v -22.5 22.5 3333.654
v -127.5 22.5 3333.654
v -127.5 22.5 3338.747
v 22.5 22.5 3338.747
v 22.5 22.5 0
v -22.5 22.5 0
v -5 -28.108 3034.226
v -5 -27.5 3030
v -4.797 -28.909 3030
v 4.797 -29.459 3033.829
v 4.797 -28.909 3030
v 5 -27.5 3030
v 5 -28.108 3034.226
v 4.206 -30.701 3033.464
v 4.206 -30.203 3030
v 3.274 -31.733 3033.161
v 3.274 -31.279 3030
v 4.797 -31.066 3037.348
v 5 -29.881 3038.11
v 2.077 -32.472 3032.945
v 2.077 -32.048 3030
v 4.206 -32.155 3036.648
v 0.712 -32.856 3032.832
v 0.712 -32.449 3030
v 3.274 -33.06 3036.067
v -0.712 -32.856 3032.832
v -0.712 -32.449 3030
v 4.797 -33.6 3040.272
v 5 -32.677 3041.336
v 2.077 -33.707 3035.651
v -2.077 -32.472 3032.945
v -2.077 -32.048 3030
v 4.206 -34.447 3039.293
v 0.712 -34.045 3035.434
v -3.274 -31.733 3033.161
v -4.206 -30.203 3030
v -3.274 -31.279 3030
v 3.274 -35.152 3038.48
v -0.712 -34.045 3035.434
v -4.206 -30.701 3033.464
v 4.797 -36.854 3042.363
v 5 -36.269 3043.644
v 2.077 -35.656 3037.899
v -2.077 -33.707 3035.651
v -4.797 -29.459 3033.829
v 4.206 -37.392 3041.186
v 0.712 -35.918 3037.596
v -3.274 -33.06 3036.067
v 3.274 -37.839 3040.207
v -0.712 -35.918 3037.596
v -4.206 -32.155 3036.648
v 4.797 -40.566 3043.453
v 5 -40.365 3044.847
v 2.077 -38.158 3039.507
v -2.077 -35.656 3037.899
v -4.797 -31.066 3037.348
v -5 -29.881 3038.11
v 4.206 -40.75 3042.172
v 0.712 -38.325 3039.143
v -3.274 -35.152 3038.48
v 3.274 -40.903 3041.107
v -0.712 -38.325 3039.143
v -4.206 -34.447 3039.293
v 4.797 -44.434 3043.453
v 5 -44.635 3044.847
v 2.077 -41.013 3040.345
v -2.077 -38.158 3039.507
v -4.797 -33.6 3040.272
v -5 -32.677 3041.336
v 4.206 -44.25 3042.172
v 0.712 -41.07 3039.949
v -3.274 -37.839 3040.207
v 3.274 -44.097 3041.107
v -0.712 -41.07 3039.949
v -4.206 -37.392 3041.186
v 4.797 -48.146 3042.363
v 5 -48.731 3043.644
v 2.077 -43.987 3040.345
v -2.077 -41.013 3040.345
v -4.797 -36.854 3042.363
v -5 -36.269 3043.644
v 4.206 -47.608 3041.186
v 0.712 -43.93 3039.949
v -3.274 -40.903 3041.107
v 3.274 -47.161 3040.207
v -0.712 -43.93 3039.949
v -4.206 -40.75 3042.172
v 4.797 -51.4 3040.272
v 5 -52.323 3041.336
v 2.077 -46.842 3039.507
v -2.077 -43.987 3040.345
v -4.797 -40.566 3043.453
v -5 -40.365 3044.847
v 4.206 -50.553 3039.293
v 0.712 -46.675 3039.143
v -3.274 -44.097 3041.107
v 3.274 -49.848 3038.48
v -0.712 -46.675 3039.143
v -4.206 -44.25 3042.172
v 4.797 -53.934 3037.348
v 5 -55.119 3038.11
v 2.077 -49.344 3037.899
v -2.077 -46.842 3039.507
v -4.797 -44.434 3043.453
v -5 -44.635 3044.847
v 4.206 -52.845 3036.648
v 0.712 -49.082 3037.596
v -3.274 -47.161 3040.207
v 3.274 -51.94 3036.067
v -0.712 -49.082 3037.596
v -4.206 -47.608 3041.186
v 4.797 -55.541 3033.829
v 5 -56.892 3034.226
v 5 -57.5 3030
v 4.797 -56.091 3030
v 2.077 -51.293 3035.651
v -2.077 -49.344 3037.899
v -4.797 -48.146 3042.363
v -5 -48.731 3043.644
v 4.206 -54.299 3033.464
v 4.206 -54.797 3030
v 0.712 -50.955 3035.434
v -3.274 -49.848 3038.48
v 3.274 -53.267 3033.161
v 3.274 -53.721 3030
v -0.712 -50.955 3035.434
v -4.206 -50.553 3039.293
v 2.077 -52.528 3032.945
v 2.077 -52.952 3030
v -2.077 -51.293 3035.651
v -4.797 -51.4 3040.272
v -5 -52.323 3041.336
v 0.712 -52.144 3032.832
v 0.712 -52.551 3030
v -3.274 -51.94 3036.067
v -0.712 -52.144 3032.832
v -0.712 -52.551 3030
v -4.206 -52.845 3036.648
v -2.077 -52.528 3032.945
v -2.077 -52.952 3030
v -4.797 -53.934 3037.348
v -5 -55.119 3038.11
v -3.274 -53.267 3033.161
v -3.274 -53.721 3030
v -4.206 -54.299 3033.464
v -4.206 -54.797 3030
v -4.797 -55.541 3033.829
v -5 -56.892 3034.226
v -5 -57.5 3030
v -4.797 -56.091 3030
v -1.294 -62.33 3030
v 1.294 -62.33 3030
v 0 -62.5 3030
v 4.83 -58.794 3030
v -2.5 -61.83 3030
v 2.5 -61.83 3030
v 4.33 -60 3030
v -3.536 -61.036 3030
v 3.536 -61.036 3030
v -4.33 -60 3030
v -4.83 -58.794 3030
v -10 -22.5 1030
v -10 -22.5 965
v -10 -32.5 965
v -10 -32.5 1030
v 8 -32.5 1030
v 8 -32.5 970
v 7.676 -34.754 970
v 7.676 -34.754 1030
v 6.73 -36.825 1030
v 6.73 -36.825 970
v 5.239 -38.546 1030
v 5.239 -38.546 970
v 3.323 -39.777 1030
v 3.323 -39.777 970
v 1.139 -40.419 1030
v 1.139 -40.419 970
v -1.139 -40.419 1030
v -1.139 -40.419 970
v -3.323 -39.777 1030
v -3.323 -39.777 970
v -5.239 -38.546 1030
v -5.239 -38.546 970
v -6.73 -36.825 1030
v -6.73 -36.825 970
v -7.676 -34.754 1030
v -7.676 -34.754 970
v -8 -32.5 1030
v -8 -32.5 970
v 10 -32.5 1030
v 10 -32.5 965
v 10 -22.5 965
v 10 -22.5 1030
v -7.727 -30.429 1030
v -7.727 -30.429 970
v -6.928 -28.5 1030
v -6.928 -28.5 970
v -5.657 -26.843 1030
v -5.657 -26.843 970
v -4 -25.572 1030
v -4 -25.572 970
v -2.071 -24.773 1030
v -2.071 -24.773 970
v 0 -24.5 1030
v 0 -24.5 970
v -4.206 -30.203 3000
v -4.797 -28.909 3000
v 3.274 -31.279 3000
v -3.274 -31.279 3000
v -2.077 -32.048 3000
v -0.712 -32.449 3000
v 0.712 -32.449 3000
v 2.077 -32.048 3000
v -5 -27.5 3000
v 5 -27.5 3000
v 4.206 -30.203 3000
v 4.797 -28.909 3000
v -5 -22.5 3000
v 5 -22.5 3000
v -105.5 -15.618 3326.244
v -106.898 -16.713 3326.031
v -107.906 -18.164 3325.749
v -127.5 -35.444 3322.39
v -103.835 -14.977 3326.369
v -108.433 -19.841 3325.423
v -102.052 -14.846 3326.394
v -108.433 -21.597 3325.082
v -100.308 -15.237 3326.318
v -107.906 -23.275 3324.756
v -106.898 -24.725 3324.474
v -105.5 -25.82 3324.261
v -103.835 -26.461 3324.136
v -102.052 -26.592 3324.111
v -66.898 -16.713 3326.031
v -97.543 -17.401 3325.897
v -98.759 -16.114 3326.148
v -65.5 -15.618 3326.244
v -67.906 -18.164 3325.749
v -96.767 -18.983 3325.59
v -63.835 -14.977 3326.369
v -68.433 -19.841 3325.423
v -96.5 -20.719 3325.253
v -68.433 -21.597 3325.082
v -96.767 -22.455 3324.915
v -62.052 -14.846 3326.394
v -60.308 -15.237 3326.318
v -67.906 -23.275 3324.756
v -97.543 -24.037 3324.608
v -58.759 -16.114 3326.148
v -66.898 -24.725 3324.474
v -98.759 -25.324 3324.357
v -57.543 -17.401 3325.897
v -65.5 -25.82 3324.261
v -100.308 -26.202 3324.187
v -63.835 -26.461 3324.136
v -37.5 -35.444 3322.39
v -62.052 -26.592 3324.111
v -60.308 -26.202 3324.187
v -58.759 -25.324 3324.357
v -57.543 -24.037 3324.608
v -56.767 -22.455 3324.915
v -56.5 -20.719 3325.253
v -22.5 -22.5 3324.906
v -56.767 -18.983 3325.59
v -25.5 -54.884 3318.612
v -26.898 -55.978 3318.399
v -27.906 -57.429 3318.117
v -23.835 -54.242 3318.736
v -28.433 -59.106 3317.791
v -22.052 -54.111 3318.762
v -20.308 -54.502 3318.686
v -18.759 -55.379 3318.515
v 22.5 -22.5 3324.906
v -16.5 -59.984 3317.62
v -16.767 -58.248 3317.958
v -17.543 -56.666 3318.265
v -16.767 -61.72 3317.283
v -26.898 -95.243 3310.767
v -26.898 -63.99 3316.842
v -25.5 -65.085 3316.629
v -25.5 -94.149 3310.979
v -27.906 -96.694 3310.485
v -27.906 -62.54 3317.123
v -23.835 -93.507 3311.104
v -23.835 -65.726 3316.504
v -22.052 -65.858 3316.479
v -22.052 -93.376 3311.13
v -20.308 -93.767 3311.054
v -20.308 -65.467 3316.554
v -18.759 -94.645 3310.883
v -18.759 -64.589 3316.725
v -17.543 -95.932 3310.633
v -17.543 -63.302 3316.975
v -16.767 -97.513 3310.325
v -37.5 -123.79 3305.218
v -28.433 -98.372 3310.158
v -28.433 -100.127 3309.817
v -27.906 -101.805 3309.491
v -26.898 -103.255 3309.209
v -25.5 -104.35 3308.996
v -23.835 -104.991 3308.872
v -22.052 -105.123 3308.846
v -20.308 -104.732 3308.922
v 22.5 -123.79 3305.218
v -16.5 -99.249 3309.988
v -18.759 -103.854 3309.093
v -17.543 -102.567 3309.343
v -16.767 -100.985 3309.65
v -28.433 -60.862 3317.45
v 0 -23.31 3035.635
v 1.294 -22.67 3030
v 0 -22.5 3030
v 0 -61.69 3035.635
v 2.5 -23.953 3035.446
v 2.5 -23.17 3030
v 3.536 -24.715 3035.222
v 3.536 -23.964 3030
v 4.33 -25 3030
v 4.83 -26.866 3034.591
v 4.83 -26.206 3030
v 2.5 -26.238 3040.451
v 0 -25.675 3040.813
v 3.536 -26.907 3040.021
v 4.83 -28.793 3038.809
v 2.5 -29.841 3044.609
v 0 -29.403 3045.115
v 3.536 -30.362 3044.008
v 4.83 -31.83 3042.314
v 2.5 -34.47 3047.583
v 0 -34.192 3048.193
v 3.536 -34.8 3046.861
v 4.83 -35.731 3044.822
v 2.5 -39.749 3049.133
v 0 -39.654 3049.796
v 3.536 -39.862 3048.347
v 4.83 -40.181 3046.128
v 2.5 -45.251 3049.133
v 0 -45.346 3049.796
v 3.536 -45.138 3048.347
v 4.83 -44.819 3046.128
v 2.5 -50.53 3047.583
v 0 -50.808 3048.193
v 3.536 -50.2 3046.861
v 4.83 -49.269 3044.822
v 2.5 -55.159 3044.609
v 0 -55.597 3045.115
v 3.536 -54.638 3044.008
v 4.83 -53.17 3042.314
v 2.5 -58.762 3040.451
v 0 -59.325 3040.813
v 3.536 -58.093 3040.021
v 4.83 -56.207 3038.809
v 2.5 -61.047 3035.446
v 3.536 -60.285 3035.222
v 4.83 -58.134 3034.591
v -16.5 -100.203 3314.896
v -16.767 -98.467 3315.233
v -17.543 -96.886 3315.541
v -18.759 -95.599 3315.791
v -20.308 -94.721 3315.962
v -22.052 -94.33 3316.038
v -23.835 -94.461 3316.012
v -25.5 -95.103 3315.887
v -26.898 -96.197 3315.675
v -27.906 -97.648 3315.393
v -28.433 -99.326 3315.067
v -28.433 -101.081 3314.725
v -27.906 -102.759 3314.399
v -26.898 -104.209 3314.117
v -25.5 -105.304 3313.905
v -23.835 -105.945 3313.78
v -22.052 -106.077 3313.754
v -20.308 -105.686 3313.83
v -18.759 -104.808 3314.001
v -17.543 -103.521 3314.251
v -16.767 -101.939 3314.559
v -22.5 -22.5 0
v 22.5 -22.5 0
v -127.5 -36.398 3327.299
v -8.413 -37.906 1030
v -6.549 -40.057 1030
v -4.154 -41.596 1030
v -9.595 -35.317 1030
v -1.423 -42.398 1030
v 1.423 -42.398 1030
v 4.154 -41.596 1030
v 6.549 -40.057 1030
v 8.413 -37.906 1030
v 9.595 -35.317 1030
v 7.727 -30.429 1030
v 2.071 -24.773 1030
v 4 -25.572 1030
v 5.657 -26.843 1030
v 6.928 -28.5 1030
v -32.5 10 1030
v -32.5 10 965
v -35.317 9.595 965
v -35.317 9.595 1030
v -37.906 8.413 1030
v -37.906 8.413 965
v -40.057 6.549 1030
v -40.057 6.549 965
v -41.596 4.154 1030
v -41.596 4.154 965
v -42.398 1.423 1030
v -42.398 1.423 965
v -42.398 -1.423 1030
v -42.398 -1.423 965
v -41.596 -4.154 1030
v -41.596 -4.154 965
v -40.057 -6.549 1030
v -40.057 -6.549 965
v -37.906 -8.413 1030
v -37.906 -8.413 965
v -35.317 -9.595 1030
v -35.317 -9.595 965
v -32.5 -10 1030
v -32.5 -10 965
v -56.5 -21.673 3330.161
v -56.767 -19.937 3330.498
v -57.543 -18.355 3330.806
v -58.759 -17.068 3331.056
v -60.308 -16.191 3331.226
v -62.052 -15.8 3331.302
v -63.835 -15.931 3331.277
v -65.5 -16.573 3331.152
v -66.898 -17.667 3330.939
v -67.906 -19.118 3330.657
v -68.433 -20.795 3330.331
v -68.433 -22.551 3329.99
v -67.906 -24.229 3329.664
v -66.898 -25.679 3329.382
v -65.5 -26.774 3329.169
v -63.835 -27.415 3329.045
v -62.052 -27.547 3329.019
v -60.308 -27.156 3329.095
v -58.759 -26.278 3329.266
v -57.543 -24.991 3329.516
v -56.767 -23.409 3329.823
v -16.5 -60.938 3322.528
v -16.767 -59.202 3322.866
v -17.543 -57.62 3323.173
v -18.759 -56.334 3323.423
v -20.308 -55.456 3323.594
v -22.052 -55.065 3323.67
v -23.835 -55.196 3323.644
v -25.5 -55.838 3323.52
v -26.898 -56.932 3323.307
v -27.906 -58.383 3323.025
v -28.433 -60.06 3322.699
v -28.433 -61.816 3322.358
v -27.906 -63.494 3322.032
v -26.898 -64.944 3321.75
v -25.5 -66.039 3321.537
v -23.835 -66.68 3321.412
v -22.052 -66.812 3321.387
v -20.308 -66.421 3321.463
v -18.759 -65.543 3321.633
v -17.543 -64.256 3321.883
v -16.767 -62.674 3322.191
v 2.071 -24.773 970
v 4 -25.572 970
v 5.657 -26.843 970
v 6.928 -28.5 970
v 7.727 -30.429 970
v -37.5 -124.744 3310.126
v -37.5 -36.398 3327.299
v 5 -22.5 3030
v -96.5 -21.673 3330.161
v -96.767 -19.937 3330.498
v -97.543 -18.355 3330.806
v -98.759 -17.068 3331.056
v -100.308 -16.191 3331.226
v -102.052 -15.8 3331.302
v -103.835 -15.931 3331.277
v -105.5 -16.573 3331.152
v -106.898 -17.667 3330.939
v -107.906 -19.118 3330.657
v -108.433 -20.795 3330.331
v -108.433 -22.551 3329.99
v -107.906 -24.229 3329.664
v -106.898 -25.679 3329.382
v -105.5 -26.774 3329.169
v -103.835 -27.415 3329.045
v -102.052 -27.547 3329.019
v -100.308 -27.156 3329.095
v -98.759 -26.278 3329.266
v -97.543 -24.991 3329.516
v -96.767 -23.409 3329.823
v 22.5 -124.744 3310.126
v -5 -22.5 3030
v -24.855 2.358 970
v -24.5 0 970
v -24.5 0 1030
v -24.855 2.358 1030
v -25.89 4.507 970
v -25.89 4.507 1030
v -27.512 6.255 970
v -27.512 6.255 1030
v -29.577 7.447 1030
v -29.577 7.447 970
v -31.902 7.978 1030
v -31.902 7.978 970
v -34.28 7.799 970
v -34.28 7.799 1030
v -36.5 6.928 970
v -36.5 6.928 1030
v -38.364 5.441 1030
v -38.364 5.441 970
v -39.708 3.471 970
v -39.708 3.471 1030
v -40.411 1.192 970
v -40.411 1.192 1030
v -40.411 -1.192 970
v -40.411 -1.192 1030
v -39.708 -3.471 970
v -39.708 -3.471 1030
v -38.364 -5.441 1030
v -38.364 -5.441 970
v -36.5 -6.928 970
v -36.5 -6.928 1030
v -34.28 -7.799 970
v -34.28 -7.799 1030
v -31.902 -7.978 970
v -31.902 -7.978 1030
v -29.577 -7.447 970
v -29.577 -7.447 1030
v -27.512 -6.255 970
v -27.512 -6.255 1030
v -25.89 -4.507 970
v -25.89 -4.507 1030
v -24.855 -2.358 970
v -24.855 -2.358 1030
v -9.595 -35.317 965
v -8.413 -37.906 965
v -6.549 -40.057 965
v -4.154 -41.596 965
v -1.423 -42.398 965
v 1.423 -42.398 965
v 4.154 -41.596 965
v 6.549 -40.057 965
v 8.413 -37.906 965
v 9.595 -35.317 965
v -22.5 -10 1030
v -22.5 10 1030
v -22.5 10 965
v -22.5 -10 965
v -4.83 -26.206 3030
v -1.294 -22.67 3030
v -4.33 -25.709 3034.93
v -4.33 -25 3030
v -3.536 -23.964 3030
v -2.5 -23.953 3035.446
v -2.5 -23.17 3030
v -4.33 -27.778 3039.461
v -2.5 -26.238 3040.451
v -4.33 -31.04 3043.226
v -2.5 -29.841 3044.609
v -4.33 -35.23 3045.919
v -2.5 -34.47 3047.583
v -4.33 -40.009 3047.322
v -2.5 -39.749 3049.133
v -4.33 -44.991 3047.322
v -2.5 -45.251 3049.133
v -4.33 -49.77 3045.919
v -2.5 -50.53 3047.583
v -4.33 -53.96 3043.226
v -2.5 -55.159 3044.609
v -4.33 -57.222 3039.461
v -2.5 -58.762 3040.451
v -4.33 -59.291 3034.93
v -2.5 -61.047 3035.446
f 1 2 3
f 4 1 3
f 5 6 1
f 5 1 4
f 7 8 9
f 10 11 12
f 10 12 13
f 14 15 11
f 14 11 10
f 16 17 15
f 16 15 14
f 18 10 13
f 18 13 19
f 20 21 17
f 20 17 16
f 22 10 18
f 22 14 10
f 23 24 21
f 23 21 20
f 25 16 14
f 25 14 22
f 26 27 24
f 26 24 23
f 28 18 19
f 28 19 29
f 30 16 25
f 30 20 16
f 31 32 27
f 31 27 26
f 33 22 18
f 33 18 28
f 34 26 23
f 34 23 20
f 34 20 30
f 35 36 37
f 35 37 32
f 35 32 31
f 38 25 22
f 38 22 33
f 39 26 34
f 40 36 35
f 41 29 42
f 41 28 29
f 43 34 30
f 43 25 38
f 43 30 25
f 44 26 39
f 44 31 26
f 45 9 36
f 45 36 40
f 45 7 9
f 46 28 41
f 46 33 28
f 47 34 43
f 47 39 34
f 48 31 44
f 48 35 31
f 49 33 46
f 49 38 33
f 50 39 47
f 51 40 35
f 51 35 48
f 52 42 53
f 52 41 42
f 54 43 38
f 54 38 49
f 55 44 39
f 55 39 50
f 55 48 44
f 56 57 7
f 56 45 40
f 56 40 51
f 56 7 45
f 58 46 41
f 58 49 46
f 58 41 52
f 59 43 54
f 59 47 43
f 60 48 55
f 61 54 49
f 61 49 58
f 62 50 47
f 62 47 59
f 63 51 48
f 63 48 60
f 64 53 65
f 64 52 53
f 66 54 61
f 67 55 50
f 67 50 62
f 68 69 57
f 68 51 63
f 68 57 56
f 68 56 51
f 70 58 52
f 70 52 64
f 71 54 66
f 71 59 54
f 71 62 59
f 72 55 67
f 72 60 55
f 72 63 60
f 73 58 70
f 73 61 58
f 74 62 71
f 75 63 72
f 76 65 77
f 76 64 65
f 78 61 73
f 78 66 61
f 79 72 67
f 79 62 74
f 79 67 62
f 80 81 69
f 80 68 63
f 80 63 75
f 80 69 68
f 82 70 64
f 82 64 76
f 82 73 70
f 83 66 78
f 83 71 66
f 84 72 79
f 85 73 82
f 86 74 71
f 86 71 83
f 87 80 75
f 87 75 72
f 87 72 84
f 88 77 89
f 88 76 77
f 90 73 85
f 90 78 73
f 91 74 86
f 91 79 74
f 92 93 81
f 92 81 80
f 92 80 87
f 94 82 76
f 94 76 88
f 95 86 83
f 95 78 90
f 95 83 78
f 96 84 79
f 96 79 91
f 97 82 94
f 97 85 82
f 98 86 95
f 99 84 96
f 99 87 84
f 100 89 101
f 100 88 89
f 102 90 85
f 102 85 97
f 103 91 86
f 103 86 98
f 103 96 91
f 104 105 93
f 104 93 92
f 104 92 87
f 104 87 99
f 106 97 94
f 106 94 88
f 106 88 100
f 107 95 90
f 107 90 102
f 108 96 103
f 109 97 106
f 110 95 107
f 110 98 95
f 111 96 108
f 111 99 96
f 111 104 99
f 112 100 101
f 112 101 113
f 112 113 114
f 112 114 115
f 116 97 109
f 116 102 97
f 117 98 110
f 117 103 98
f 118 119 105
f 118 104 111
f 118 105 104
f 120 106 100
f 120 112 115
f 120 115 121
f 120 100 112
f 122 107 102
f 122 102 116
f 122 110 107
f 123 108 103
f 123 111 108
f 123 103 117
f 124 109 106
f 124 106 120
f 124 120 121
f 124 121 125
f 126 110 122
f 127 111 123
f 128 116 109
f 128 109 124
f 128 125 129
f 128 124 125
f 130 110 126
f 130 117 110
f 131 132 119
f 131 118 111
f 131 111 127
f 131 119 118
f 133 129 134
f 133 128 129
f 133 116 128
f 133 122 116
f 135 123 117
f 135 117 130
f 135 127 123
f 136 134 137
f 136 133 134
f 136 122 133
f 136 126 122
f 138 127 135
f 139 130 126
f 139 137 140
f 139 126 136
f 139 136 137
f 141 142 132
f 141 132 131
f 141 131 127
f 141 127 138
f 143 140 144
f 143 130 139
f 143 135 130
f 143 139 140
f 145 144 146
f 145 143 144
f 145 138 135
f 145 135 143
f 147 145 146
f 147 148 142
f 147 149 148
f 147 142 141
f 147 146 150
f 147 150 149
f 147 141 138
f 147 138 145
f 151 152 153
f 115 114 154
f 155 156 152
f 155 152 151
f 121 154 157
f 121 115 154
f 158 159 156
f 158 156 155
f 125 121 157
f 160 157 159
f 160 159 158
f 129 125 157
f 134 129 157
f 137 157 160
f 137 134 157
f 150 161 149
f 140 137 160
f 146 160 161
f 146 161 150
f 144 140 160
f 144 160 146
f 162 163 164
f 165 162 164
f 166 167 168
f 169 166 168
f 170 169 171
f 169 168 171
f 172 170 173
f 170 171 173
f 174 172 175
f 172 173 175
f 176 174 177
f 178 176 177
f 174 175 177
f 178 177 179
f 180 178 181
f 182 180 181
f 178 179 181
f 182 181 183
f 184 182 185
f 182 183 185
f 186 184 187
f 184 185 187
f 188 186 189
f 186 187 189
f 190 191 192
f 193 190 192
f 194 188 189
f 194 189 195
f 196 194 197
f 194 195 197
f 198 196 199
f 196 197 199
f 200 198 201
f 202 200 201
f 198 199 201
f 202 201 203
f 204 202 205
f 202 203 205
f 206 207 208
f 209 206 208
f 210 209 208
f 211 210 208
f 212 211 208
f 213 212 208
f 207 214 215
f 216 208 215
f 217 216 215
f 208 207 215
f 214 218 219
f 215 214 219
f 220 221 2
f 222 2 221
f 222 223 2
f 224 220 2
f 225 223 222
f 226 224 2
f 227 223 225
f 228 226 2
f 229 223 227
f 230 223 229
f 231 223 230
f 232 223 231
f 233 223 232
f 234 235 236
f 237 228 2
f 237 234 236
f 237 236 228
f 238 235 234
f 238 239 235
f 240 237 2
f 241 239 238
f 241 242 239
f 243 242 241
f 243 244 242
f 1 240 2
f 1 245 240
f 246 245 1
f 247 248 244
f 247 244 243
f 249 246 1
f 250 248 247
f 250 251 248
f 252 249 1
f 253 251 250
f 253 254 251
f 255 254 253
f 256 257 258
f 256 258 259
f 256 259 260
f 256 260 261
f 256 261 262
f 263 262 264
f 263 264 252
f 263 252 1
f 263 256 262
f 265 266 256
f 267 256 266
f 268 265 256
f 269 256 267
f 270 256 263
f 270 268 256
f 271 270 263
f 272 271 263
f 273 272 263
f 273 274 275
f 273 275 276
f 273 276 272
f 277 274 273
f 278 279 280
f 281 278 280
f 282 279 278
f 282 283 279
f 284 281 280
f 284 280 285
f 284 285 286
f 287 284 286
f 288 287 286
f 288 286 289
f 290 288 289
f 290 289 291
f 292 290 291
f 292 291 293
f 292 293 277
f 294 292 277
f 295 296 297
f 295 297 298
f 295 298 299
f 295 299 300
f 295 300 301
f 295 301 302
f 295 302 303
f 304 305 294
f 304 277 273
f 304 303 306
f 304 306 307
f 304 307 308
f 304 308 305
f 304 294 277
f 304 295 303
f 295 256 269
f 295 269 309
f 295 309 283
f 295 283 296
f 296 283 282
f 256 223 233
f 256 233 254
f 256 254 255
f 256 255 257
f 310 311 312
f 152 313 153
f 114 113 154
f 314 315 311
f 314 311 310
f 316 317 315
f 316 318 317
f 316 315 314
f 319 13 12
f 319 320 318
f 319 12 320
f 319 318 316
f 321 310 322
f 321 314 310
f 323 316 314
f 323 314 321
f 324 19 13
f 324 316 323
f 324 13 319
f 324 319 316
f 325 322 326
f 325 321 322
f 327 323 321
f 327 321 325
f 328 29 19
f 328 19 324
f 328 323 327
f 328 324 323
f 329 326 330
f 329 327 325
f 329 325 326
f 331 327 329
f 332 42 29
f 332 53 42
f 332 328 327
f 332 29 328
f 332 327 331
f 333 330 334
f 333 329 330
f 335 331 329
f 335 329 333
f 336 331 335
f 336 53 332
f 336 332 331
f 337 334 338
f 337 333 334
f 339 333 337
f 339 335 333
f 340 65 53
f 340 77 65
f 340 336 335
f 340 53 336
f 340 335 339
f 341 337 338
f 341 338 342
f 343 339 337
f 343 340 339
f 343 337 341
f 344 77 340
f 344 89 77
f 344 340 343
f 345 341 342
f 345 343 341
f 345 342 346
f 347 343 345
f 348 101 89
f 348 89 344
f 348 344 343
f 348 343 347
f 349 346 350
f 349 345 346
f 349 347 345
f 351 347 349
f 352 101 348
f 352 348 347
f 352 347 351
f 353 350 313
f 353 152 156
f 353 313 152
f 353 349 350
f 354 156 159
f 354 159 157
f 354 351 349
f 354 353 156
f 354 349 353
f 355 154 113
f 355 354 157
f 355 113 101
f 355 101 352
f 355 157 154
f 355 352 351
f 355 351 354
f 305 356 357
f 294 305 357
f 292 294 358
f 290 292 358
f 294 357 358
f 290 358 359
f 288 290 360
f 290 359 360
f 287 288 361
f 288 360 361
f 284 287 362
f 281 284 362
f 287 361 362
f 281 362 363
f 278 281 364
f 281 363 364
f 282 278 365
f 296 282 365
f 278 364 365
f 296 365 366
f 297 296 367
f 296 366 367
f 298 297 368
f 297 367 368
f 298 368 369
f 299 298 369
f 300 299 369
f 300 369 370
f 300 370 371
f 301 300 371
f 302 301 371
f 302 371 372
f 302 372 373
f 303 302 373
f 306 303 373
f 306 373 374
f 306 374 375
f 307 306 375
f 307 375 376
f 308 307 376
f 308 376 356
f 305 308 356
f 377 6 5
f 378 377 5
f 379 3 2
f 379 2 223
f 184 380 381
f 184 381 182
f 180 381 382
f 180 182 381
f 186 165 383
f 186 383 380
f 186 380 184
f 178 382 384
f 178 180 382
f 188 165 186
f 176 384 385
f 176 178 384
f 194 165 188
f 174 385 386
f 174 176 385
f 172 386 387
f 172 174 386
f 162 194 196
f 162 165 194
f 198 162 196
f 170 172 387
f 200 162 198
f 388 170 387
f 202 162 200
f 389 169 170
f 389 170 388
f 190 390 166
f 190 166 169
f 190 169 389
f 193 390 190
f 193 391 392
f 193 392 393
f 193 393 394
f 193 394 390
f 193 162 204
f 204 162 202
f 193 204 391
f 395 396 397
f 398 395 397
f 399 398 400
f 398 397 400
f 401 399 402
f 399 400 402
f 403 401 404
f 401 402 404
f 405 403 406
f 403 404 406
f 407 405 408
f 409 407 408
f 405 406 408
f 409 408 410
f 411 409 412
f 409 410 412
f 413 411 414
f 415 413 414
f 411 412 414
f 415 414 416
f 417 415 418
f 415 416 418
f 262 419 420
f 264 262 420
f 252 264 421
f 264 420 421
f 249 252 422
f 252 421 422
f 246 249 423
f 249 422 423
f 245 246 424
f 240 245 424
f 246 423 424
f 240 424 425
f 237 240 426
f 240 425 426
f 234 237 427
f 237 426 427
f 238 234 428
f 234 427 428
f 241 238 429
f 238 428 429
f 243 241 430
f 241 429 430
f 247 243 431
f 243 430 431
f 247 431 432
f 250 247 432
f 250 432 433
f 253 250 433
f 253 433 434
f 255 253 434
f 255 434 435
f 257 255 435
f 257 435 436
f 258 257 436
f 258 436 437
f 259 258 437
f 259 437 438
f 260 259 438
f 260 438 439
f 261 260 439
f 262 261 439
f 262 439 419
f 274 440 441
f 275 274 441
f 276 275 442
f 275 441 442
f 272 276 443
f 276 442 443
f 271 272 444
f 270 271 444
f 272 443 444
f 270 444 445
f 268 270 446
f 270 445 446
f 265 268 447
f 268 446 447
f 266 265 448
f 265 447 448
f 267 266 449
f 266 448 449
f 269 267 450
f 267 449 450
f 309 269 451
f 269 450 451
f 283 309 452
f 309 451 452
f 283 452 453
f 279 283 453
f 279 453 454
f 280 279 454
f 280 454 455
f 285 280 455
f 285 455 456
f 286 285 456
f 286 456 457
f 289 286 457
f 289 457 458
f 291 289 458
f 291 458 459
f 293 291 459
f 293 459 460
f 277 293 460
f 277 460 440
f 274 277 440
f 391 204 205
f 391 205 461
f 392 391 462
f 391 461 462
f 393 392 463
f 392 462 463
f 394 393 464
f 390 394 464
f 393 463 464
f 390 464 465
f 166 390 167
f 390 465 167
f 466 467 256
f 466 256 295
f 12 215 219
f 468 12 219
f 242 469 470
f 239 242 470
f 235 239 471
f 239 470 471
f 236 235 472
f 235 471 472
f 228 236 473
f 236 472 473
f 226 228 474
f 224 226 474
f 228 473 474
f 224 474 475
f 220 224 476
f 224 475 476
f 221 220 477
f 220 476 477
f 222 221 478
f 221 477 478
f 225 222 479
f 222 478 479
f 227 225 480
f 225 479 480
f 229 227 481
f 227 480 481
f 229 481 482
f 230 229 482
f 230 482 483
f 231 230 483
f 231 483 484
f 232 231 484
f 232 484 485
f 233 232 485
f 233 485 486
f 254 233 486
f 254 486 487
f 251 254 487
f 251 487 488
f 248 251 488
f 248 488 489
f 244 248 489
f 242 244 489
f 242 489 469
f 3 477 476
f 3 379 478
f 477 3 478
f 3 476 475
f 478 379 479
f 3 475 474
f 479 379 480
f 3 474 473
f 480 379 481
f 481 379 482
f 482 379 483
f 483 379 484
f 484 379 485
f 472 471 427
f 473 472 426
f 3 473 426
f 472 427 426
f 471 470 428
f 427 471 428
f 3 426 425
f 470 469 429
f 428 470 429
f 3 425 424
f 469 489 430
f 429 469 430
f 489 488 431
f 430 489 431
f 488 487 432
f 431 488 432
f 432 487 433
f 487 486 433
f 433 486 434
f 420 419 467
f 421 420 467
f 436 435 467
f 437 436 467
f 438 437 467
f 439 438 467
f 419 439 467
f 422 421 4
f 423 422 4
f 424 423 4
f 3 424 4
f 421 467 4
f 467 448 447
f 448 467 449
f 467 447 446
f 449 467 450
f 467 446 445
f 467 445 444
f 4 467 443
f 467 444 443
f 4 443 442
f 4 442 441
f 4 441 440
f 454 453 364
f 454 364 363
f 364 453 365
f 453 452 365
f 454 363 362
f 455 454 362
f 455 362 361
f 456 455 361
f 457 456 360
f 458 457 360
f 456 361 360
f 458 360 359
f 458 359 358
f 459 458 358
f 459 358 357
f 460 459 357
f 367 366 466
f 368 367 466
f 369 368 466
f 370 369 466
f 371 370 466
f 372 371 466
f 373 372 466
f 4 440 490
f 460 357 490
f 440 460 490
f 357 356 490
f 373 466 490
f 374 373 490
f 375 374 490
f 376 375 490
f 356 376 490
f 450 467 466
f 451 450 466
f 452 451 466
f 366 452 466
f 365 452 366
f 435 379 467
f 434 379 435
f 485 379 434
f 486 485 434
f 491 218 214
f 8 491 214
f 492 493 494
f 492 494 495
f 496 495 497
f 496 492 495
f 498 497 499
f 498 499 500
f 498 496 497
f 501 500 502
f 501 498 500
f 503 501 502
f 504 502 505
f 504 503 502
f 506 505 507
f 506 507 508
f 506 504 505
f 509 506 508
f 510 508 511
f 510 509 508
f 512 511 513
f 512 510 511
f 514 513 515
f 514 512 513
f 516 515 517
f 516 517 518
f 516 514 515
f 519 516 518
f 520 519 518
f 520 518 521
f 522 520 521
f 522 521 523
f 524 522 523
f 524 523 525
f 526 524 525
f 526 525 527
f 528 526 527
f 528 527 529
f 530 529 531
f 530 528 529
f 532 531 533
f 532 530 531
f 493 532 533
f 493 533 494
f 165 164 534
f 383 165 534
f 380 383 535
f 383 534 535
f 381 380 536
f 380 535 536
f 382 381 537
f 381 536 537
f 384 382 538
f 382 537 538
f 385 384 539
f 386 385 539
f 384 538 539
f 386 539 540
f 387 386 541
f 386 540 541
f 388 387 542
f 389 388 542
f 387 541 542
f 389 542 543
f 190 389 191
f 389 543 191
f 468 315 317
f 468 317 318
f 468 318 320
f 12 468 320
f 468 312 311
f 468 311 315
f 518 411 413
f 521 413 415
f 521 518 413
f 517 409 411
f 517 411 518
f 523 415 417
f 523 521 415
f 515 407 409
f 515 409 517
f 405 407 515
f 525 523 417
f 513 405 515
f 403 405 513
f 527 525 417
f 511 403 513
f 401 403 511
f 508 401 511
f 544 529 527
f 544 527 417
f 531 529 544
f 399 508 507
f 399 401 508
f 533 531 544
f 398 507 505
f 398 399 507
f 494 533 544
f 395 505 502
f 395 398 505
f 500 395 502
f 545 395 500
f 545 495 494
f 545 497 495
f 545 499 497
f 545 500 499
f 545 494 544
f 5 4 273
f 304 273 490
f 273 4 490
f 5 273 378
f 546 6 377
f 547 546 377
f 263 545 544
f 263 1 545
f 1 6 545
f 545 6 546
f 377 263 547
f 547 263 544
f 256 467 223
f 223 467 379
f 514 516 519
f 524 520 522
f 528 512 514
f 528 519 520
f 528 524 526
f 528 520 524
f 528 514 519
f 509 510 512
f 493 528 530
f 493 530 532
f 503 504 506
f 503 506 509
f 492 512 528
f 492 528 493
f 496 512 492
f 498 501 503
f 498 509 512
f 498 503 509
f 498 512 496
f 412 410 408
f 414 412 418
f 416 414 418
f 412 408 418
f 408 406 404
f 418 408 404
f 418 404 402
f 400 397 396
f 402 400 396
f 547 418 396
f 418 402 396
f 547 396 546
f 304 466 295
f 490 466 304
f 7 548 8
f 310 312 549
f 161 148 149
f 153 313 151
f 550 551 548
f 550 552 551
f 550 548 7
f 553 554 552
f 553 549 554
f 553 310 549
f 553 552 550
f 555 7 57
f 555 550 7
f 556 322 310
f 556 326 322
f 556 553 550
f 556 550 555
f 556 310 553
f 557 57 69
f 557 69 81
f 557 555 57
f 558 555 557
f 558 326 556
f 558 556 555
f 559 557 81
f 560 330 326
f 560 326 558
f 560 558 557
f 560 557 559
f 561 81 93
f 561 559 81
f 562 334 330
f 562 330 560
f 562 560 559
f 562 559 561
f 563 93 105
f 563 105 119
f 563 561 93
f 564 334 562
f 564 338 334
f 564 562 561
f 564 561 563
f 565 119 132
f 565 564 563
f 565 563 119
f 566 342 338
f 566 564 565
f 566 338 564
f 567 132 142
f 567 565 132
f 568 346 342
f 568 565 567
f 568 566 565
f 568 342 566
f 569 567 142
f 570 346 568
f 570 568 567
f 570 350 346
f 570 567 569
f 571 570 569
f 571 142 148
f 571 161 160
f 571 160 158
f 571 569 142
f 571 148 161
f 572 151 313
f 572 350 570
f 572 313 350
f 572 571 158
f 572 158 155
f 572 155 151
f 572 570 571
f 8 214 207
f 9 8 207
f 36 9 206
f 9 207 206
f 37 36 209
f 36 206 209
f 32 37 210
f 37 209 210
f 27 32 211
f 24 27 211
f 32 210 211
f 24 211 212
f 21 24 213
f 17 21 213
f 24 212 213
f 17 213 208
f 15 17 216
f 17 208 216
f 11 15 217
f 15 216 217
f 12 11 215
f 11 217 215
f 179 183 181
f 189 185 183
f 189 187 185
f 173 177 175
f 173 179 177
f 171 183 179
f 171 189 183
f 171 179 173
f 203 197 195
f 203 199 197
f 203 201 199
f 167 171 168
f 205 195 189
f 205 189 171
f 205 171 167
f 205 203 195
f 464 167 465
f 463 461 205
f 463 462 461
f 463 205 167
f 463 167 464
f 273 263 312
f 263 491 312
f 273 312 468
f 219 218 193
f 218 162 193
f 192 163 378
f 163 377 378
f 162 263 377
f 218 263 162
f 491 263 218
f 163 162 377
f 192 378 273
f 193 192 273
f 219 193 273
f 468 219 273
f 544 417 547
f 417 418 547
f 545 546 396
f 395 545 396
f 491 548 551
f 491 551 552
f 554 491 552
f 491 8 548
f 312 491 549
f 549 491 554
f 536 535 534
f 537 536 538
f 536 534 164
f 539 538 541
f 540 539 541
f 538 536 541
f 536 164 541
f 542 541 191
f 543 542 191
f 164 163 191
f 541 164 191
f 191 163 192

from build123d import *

# Parameters (mm, degrees)
F0_W      = 45
F0_H      = 45
F1_DEPTH  = 3330
F4_DEPTH  = 5
F7_W      = 45
F7_H      = 45.842251273
F8_DEPTH  = 25
F9_W      = 60
F9_H      = 60
F9_W_2    = 90
F9_H_2    = 90
F10_DEPTH = 5
F11_R     = 6
F12_DEPTH = 25
F13_W     = 150
F13_H     = 4.7702248844
F14_DEPTH = 3358.6871623993
F15_R     = 8
F16_DEPTH = 60
F20_DEPTH = 109
F21_DEPTH = 30


with BuildPart() as f1:
    # F0 (on Top) → F1 (new body)
    with BuildSketch(Plane.XY):
        Rectangle(F0_W, F0_H)
    extrude(amount=F1_DEPTH)

    # F3 (on offset) → F4 (join)
    with BuildSketch(Plane.XY.offset(965)):
        Polygon((2, -22.5), (0, -22.5), (0, -32.5), (2, -32.5), (2, -22.7020410289), align=None)
        Polygon((0, -32.5), (0, -22.5), (-2, -22.5), (-2, -22.7020410289), (-2, -32.5), align=None)
        with BuildLine():
            Line((2, -32.5), (0, -32.5))
            Line((0, -32.5), (-2, -32.5))
            Line((-2, -32.5), (-10, -32.5))
            ThreePointArc((-10, -32.5), (0, -42.5), (10, -32.5))
            Line((10, -32.5), (2, -32.5))
        make_face()
        with BuildLine():
            Line((-32.5, 0), (-22.5, 0))
            ThreePointArc((-22.5, 0), (-25.4289321881, 7.0710678119), (-32.5, 10))
            Line((-32.5, 10), (-32.5, 0))
        make_face()
        with BuildLine():
            Line((-32.5, -10), (-32.5, 0))
            Line((-32.5, 0), (-32.5, 10))
            ThreePointArc((-32.5, 10), (-42.5, 0), (-32.5, -10))
        make_face()
        with BuildLine():
            ThreePointArc((-32.5, -10), (-25.4289321881, -7.0710678119), (-22.5, 0))
            Line((-22.5, 0), (-32.5, 0))
            Line((-32.5, 0), (-32.5, -10))
        make_face()
        with BuildLine():
            Line((2, -22.7020410289), (2, -32.5))
            Line((2, -32.5), (10, -32.5))
            ThreePointArc((10, -32.5), (7.7459666924, -26.1754446797), (2, -22.7020410289))
        make_face()
        with BuildLine():
            Line((10, -22.5), (2, -22.5))
            Line((2, -22.5), (2, -22.7020410289))
            ThreePointArc((2, -22.7020410289), (7.7459666924, -26.1754446797), (10, -32.5))
            Line((10, -32.5), (10, -22.5))
        make_face()
        with BuildLine():
            Line((-10, -32.5), (-2, -32.5))
            Line((-2, -32.5), (-2, -22.7020410289))
            ThreePointArc((-2, -22.7020410289), (-7.7459666924, -26.1754446797), (-10, -32.5))
        make_face()
        with BuildLine():
            Line((-2, -22.7020410289), (-2, -22.5))
            Line((-2, -22.5), (-10, -22.5))
            Line((-10, -22.5), (-10, -32.5))
            ThreePointArc((-10, -32.5), (-7.7459666924, -26.1754446797), (-2, -22.7020410289))
        make_face()
        with BuildLine():
            Line((-22.5, -10), (-22.5, 0))
            ThreePointArc((-22.5, 0), (-25.4289321881, -7.0710678119), (-32.5, -10))
            Line((-32.5, -10), (-22.5, -10))
        make_face()
        with BuildLine():
            ThreePointArc((-32.5, 10), (-25.4289321881, 7.0710678119), (-22.5, 0))
            Line((-22.5, 0), (-22.5, 10))
            Line((-22.5, 10), (-32.5, 10))
        make_face()
    extrude(amount=F4_DEPTH)

    # F7 (on face) → F8 (join)
    with BuildSketch(Plane(origin=(0, -624.5391596736, 3212.9754420296), x_dir=(1, 0, 0), z_dir=(0, 0.1908089954, -0.9816271834))):
        with Locations((0, -636.2284686128)):
            Rectangle(F7_W, F7_H)
    extrude(amount=F8_DEPTH)

    # F9 (on face) → F10 (join)
    with BuildSketch(Plane(origin=(0, -624.5391596736, 3212.9754420296), x_dir=(1, 0, 0), z_dir=(0, 0.1908089954, -0.9816271834))):
        with Locations((-7.5, -629.1495942493)):
            Rectangle(F9_W, F9_H)
        with Locations((-82.5, -629.1495942493)):
            Rectangle(F9_W_2, F9_H)
        with Locations((-7.5, -554.1495942493)):
            Rectangle(F9_W, F9_H_2)
    extrude(amount=F10_DEPTH)

    # F11 (on face) → F12 (cut)
    with BuildSketch(Plane(origin=(0, -624.5391596736, 3212.9754420296), x_dir=(1, 0, 0), z_dir=(0, -0.1908089954, 0.9816271834))):
        with Locations((-22.5, 534.1495942493)):
            Circle(F11_R)
        with Locations((-22.5, 574.1495942493)):
            Circle(F11_R)
        with Locations((-62.5, 614.1495942493)):
            Circle(F11_R)
        with Locations((-102.5, 614.1495942493)):
            Circle(F11_R)
    extrude(amount=-F12_DEPTH, mode=Mode.SUBTRACT)

    # F13 (on Top) → F14 (cut)
    with BuildSketch(Plane.XY):
        with Locations((52.5, 24.8851124422)):
            Rectangle(F13_W, F13_H)
    extrude(amount=F14_DEPTH, mode=Mode.SUBTRACT)

    # F15 (on face) → F16 (join)
    with BuildSketch(Plane.XY.offset(970)):
        with BuildLine():
            ThreePointArc((-32.5, -10), (-25.4289321881, -7.0710678119), (-22.5, 0))
            ThreePointArc((-22.5, 0), (-25.4289321881, 7.0710678119), (-32.5, 10))
            ThreePointArc((-32.5, 10), (-42.5, 0), (-32.5, -10))
        make_face()
        with Locations((-32.5, 0)):
            Circle(F15_R, mode=Mode.SUBTRACT)
        with BuildLine():
            Line((-22.5, -10), (-22.5, 0))
            ThreePointArc((-22.5, 0), (-25.4289321881, -7.0710678119), (-32.5, -10))
            Line((-32.5, -10), (-22.5, -10))
        make_face()
        with BuildLine():
            ThreePointArc((-32.5, 10), (-25.4289321881, 7.0710678119), (-22.5, 0))
            Line((-22.5, 0), (-22.5, 10))
            Line((-22.5, 10), (-32.5, 10))
        make_face()
        with BuildLine():
            ThreePointArc((10, -32.5), (7.0710678119, -25.4289321881), (0, -22.5))
            ThreePointArc((0, -22.5), (-7.0710678119, -25.4289321881), (-10, -32.5))
            ThreePointArc((-10, -32.5), (0, -42.5), (10, -32.5))
        make_face()
        with BuildLine():
            ThreePointArc((8, -32.5), (0, -40.5), (-8, -32.5))
            ThreePointArc((-8, -32.5), (-5.6568542495, -26.8431457505), (0, -24.5))
            ThreePointArc((0, -24.5), (5.6568542495, -26.8431457505), (8, -32.5))
        make_face(mode=Mode.SUBTRACT)
        with BuildLine():
            ThreePointArc((-10, -32.5), (-7.0710678119, -25.4289321881), (0, -22.5))
            Line((0, -22.5), (-10, -22.5))
            Line((-10, -22.5), (-10, -32.5))
        make_face()
        with BuildLine():
            Line((10, -22.5), (0, -22.5))
            ThreePointArc((0, -22.5), (7.0710678119, -25.4289321881), (10, -32.5))
            Line((10, -32.5), (10, -22.5))
        make_face()
    extrude(amount=F16_DEPTH)

    # F19 (on face) → F20 (cut)
    with BuildSketch(Plane.YZ.offset(-22.5)):
        Polygon((22.5, 3333.6535304364), (23.4540449769, 3333.838977994), (22.5, 3338.7471139112), align=None)
    extrude(amount=-F20_DEPTH, mode=Mode.SUBTRACT)

    # F18 (on offset) → F21 (join)
    with BuildSketch(Plane.XY.offset(3000)):
        with BuildLine():
            ThreePointArc((5, -27.5), (3.5355339059, -23.9644660941), (0, -22.5))
            Line((0, -22.5), (0, -27.5))
            Line((0, -27.5), (5, -27.5))
        make_face()
        with BuildLine():
            Line((5, -22.5), (0, -22.5))
            ThreePointArc((0, -22.5), (3.5355339059, -23.9644660941), (5, -27.5))
            Line((5, -27.5), (5, -22.5))
        make_face()
        with BuildLine():
            Line((0, -27.5), (0, -22.5))
            ThreePointArc((0, -22.5), (-3.5355339059, -23.9644660941), (-5, -27.5))
            ThreePointArc((-5, -27.5), (0, -32.5), (5, -27.5))
            Line((5, -27.5), (0, -27.5))
        make_face()
        with BuildLine():
            ThreePointArc((-5, -27.5), (-3.5355339059, -23.9644660941), (0, -22.5))
            Line((0, -22.5), (-5, -22.5))
            Line((-5, -22.5), (-5, -27.5))
        make_face()
    extrude(amount=F21_DEPTH)

    # F24: sweep along a path in F23
    with BuildLine(Plane.YZ) as f24_path:
        ThreePointArc((-27.5, 3030), (-42.5, 3045), (-57.5, 3030))
    # F22 (on face) → F24 (sweep)
    with BuildSketch(Plane.XY.offset(3030)):
        with BuildLine():
            ThreePointArc((0, -22.5), (-3.5355339059, -23.9644660941), (-5, -27.5))
            ThreePointArc((-5, -27.5), (0, -32.5), (5, -27.5))
            ThreePointArc((5, -27.5), (3.5355339059, -23.9644660941), (0, -22.5))
        make_face()
    sweep(path=f24_path.line)


solid = f1.part
